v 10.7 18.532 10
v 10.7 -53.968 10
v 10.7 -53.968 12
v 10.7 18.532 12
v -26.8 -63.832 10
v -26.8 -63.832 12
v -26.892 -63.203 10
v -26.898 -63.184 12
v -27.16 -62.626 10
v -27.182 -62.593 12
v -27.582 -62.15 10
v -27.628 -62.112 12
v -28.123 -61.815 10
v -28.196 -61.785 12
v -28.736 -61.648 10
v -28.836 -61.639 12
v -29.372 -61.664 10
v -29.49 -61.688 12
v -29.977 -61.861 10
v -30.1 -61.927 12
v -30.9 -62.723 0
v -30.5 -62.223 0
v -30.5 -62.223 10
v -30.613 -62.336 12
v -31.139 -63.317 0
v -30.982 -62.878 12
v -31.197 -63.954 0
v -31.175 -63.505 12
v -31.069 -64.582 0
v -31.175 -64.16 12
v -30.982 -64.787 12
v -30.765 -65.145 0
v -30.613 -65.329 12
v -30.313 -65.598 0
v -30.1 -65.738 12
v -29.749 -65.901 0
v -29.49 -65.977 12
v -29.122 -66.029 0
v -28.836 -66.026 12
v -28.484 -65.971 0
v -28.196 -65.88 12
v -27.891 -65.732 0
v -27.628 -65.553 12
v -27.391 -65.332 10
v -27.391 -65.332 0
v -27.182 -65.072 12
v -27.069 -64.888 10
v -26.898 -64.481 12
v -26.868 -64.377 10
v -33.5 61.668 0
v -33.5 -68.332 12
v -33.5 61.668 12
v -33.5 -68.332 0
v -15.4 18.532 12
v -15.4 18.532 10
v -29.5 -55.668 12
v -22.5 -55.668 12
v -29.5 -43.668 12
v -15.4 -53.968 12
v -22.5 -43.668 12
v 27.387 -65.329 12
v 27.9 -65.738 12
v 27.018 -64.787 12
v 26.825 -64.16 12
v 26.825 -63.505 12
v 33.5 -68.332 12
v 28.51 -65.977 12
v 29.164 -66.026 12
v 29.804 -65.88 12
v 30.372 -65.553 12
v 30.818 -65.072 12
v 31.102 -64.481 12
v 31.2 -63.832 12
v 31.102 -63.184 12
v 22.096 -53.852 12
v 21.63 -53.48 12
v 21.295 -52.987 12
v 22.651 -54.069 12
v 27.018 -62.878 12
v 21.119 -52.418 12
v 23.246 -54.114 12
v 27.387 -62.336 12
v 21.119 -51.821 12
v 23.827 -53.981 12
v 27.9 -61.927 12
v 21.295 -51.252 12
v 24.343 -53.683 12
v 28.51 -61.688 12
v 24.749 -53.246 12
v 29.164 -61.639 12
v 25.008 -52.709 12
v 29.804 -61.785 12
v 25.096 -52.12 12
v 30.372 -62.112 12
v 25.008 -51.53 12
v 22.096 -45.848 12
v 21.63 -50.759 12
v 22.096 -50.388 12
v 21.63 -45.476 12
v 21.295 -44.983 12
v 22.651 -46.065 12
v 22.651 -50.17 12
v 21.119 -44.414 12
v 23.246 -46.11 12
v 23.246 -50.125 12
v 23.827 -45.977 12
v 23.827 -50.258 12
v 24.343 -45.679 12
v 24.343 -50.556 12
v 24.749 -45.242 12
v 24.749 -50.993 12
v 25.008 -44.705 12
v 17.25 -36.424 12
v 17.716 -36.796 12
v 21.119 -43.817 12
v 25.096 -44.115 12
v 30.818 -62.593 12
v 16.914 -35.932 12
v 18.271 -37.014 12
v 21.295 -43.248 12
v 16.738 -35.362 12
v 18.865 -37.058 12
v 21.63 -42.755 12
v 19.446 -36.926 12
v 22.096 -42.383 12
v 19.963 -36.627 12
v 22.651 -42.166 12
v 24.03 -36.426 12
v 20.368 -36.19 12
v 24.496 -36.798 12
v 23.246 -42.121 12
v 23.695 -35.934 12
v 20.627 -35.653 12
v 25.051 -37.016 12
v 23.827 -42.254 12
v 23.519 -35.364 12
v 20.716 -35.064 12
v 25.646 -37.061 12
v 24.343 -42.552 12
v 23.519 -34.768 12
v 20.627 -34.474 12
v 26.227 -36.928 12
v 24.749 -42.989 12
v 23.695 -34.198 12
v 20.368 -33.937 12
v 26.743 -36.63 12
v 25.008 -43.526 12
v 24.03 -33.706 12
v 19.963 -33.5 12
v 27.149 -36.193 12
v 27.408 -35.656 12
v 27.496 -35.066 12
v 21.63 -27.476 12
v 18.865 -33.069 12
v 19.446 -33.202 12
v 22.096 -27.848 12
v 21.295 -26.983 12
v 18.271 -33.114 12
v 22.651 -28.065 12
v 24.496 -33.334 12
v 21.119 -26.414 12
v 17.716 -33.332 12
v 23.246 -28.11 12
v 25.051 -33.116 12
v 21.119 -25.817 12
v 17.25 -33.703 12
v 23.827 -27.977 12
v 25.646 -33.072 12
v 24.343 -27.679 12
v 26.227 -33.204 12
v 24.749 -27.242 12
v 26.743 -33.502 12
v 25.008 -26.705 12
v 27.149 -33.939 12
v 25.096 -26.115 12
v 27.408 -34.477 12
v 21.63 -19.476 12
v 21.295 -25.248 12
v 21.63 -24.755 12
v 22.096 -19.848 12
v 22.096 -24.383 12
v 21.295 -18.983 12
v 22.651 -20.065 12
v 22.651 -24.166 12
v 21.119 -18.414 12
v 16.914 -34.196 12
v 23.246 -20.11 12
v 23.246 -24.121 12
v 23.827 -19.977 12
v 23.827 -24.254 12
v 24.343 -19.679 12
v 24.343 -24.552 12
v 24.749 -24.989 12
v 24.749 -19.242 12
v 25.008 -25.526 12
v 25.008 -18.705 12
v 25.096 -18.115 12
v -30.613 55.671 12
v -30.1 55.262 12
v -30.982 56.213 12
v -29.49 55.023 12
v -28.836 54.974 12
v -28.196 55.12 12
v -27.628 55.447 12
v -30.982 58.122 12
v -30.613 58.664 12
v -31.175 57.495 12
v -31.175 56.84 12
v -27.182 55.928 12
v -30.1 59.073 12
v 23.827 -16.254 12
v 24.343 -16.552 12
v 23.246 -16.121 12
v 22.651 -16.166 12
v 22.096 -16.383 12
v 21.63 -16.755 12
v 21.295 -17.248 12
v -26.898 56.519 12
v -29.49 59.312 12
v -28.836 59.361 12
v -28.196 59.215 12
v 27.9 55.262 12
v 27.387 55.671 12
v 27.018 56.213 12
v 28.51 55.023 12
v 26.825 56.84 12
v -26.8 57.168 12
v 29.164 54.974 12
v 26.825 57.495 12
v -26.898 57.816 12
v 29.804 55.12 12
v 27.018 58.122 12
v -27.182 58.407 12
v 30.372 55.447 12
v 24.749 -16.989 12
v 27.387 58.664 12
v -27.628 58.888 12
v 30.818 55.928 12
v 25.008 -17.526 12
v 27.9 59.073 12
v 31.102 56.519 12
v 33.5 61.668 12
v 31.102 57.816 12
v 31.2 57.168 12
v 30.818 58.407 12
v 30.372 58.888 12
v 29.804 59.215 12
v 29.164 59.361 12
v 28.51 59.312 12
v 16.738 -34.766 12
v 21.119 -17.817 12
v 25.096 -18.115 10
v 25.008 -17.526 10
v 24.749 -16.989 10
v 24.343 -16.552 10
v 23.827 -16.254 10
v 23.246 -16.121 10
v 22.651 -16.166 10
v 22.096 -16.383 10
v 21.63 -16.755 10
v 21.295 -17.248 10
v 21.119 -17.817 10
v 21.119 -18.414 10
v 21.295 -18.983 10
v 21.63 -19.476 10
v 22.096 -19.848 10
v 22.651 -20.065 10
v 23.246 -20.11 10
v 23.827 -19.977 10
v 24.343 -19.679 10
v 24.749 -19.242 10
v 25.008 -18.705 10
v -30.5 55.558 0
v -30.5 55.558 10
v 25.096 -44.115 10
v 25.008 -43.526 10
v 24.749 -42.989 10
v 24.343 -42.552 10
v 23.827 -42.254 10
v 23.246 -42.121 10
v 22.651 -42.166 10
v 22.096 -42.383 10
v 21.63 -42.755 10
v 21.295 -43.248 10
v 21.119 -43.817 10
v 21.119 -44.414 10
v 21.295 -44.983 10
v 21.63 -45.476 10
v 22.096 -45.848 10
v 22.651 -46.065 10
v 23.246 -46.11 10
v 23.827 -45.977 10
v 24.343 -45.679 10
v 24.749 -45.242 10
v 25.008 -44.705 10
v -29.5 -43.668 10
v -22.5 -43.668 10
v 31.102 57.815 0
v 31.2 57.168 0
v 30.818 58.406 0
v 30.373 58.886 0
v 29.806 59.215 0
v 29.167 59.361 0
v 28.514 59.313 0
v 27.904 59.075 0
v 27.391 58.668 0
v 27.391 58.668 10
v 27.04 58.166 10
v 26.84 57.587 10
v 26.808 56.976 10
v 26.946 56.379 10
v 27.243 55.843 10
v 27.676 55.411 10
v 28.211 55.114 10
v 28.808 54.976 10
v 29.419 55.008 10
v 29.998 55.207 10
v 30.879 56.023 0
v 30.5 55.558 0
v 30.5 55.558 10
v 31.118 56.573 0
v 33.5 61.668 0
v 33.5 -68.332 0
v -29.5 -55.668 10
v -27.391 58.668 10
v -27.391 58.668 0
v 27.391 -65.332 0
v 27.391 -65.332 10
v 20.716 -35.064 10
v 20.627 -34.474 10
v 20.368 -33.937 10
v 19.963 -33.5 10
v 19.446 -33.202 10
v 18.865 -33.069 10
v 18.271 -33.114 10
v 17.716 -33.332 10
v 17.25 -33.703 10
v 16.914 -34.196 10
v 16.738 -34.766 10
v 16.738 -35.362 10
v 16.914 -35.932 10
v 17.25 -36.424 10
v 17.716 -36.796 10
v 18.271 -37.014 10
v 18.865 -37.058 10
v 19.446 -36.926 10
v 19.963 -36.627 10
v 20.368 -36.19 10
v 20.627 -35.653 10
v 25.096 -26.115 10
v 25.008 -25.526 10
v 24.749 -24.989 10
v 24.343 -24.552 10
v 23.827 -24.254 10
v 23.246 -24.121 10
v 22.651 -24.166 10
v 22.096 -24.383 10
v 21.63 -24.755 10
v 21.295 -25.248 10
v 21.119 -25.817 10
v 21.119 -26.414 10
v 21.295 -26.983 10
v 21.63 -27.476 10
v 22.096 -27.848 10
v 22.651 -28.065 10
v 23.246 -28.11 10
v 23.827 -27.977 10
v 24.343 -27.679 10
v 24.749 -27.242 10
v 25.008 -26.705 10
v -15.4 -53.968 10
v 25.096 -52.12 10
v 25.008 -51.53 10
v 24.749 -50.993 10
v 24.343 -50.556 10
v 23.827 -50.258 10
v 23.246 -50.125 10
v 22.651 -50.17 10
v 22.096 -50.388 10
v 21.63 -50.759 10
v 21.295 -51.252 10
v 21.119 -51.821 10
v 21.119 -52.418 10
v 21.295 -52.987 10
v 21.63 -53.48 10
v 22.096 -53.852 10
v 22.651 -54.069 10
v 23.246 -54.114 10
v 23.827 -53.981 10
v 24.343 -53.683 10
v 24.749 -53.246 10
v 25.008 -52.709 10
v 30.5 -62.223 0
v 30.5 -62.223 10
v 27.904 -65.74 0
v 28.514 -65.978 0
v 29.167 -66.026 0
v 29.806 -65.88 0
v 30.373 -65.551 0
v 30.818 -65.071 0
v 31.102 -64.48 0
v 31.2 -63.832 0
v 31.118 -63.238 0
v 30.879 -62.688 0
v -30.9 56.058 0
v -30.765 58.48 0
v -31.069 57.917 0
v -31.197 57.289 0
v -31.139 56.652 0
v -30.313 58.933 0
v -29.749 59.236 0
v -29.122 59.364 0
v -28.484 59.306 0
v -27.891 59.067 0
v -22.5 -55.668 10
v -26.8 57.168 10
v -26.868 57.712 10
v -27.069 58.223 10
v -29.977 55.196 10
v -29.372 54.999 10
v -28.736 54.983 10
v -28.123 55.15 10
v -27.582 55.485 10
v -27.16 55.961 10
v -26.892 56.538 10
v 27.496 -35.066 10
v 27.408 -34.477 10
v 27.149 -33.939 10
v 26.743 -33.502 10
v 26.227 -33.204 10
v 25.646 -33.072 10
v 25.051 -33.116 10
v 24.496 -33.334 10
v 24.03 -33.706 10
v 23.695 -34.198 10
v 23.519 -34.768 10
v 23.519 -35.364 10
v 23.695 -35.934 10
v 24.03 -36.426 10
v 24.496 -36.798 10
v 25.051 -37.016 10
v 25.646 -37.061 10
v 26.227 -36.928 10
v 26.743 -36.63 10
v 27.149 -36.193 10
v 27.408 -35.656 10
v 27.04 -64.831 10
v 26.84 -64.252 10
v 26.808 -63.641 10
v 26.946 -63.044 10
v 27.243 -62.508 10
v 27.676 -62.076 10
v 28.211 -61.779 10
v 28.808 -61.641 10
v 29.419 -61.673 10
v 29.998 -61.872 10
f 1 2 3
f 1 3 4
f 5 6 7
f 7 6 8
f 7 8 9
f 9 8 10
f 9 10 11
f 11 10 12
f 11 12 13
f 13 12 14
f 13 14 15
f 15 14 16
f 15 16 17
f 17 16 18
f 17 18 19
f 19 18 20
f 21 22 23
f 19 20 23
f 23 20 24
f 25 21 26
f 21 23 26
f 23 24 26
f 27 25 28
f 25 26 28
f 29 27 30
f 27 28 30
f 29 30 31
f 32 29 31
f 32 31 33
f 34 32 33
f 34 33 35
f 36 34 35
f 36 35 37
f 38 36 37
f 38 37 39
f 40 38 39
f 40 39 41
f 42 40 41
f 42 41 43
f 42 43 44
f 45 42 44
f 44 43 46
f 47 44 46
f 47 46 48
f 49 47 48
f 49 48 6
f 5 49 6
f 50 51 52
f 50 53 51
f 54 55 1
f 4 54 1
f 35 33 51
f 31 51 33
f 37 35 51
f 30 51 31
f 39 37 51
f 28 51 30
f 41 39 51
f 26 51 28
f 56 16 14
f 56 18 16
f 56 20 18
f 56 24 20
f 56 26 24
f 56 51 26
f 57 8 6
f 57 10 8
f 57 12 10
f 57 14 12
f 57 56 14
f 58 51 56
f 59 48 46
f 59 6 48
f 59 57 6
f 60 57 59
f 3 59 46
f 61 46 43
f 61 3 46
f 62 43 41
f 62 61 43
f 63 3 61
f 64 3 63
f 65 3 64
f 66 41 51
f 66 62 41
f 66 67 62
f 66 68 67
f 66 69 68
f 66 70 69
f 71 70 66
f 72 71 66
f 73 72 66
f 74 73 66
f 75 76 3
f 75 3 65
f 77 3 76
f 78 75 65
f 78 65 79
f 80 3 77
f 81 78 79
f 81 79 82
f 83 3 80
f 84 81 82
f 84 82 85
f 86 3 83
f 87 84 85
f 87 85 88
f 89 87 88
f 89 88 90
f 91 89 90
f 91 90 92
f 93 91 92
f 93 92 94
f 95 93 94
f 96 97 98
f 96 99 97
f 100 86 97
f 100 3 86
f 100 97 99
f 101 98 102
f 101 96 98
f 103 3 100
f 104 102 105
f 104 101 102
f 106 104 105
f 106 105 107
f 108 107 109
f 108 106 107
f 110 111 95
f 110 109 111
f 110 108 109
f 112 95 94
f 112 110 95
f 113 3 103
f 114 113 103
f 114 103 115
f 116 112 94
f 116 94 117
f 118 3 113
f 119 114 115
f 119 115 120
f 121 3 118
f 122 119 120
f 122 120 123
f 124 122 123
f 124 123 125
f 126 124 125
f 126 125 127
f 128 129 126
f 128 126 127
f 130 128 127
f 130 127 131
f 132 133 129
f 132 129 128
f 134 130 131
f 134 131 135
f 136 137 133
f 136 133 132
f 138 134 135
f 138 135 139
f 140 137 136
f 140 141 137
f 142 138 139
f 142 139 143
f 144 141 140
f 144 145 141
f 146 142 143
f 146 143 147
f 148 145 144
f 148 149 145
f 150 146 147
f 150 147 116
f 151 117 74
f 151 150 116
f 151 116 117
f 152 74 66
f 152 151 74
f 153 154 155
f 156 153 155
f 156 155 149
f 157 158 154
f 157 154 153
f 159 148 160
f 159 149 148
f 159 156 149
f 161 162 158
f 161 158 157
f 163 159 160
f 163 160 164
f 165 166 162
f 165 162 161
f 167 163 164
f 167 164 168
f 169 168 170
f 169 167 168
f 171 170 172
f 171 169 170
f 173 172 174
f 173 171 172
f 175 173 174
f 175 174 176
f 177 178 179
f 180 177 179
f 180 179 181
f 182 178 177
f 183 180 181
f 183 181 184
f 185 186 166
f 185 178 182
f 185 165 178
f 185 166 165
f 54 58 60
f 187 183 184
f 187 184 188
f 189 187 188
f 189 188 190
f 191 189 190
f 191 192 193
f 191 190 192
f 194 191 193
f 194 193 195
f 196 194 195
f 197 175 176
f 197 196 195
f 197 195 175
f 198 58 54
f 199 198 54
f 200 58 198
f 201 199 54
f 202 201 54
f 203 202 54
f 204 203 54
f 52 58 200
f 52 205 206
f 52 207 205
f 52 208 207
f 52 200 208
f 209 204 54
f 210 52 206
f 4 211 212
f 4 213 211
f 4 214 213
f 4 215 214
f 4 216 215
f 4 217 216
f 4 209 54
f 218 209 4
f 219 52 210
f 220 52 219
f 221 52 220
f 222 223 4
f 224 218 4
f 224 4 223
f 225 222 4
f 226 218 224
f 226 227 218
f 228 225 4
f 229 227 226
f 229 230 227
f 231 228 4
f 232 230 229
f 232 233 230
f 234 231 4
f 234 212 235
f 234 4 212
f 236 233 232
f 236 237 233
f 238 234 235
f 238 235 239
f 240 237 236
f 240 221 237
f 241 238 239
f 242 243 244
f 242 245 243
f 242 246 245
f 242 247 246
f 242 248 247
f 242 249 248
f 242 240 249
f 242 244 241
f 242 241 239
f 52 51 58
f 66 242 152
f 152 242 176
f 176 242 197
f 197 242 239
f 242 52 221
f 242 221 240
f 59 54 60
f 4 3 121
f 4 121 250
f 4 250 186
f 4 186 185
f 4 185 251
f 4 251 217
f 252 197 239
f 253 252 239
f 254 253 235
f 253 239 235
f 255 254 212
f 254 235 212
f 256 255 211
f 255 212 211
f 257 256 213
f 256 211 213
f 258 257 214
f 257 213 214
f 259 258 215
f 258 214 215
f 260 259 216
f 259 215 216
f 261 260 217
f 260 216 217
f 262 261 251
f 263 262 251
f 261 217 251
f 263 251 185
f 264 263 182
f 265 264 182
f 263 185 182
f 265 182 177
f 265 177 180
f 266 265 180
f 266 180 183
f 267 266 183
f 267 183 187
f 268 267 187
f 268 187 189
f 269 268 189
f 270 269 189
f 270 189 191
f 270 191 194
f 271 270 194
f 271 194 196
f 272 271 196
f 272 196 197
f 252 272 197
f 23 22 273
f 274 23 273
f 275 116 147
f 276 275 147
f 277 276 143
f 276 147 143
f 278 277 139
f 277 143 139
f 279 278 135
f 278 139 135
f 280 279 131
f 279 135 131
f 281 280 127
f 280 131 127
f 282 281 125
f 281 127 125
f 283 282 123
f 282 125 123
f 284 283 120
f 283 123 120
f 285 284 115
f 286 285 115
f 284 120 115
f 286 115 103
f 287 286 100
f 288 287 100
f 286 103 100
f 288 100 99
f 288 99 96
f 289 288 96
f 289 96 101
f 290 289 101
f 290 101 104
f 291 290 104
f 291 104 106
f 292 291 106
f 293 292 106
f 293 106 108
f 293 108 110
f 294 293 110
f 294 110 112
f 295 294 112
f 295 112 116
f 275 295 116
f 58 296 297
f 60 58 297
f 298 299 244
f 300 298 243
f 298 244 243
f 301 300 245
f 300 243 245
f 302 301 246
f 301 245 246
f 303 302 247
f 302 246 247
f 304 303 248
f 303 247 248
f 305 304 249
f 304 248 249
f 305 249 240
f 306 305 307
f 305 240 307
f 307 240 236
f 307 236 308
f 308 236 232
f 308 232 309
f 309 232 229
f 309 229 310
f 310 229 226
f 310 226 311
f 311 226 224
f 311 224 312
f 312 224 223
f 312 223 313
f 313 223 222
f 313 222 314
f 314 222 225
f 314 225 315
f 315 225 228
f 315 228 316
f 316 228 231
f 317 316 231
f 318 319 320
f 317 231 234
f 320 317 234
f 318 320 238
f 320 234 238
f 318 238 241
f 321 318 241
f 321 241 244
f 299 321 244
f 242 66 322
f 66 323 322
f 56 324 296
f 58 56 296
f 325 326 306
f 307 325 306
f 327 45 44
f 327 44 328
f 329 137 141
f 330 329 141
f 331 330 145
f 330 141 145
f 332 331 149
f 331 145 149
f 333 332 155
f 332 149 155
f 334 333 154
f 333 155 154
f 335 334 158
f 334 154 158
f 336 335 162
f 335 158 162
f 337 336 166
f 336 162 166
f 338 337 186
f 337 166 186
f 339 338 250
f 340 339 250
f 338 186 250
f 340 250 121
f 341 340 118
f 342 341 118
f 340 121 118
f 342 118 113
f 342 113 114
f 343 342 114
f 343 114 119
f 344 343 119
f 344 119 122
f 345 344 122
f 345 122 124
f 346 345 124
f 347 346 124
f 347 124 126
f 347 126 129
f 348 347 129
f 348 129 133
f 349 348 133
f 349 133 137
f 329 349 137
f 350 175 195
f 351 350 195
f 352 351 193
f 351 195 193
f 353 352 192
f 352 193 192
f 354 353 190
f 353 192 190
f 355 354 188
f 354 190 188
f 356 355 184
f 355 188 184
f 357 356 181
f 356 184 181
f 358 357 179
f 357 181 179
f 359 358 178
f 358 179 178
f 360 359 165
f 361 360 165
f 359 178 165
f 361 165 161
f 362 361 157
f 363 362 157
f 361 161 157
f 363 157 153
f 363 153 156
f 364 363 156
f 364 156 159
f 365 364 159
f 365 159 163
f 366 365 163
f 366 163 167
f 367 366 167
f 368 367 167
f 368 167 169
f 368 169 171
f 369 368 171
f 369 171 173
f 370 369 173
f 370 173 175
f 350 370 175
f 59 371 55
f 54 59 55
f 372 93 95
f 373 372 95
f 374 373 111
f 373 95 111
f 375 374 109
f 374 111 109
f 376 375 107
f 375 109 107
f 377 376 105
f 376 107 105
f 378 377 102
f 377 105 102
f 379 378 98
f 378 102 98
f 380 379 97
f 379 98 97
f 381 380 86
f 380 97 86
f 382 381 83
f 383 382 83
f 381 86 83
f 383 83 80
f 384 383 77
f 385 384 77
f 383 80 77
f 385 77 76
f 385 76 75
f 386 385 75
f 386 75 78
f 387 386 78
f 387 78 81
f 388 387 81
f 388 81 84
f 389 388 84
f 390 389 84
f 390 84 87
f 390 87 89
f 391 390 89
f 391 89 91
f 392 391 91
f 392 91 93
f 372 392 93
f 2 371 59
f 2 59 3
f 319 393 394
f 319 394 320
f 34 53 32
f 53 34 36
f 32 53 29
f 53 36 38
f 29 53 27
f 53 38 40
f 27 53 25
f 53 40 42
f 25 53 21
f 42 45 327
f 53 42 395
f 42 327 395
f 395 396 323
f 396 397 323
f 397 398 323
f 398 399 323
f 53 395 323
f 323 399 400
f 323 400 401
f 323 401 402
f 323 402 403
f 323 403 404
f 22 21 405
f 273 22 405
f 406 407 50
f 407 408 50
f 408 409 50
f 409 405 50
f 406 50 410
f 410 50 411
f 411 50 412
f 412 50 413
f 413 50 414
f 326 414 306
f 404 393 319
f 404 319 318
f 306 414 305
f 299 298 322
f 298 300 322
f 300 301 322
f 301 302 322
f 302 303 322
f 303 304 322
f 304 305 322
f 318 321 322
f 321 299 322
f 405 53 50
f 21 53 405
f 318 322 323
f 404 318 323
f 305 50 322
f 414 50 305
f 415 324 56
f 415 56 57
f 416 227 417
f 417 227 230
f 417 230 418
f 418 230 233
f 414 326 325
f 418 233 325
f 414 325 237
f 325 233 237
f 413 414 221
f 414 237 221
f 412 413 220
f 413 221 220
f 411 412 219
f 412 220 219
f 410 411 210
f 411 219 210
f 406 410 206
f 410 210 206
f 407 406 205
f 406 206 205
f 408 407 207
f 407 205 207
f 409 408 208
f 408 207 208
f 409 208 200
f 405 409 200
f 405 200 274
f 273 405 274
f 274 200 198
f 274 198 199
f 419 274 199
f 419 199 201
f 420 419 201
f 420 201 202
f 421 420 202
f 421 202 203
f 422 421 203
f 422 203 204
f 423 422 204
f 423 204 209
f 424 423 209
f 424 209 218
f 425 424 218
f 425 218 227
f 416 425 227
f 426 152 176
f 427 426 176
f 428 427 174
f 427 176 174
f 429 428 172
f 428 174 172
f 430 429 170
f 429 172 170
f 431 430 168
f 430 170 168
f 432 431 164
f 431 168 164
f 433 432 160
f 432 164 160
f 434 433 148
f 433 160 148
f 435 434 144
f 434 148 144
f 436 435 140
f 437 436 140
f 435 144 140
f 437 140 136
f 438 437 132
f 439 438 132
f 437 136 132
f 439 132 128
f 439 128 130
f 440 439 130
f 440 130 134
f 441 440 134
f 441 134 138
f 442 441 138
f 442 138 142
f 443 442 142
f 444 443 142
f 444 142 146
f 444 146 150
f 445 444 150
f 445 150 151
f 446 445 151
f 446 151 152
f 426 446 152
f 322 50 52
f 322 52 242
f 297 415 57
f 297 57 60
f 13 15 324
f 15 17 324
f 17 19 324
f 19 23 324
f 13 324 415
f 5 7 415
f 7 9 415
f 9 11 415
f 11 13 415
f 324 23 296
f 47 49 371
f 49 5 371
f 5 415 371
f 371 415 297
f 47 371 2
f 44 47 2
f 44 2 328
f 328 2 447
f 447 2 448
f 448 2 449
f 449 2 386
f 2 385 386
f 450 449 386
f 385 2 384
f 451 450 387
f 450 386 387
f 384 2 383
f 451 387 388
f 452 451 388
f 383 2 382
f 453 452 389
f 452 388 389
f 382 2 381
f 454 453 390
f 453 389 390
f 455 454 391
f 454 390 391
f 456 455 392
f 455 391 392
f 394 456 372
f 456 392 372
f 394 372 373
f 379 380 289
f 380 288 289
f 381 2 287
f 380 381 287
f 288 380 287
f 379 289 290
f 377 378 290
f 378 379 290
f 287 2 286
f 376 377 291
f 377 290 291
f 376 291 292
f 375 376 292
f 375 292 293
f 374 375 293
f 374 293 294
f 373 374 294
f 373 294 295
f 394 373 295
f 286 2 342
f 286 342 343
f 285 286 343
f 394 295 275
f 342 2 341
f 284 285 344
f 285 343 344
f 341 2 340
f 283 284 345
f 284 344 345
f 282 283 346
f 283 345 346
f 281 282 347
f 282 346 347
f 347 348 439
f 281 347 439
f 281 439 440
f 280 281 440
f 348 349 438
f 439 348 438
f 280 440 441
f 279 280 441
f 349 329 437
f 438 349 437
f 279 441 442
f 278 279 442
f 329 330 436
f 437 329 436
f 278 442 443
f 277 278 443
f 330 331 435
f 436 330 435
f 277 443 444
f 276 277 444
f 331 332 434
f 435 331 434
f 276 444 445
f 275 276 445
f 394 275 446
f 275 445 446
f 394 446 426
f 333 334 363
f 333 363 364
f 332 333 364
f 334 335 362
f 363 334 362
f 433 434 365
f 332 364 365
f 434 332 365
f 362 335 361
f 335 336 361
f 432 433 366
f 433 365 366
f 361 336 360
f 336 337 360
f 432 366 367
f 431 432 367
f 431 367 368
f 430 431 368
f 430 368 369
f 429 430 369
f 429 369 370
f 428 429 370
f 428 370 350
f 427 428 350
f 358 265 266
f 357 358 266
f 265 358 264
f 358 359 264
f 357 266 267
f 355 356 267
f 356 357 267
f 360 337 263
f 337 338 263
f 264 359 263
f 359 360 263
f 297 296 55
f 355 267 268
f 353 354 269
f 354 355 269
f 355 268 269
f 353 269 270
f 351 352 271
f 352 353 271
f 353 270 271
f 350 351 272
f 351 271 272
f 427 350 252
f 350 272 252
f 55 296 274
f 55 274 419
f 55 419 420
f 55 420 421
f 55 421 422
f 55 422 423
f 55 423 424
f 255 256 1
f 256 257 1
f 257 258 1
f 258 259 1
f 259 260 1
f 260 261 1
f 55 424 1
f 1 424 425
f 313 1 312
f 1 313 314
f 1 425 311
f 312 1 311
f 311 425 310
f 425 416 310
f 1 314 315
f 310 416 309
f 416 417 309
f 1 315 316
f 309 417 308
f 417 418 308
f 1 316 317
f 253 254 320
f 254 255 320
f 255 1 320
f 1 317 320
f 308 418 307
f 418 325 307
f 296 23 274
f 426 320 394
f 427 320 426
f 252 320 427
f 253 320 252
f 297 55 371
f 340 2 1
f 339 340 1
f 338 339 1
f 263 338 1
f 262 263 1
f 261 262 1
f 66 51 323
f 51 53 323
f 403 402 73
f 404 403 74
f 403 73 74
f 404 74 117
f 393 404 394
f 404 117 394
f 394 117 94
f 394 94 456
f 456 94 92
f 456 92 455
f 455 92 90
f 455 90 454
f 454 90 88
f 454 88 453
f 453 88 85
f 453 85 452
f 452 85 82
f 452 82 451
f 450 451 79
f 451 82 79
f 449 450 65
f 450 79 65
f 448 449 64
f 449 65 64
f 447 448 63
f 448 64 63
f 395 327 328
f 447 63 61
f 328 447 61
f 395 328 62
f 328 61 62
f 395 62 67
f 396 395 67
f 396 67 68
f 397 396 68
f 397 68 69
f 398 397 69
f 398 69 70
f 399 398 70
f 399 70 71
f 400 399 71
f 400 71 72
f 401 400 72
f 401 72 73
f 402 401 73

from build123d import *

# Parameters (mm, degrees)
SKETCH1_W           = 67
SKETCH1_H           = 130
SKETCH1_W_2         = 61
SKETCH1_H_2         = 124
BOSS_EXTRUDE1_DEPTH = 10
SKETCH2_W           = 67
SKETCH2_H           = 130
SKETCH2_W_2         = 26.1
SKETCH2_H_2         = 72.5
SKETCH2_W_3         = 7
SKETCH2_H_3         = 11.999999998
BOSS_EXTRUDE2_DEPTH = 2
SKETCH3_R           = 2
CUT_EXTRUDE1_DEPTH  = 78.042717027
SKETCH4_R           = 2.2
CUT_EXTRUDE2_DEPTH  = 78.042717027


with BuildPart() as part:
    # Sketch1 → Boss-Extrude1 (new body)
    with BuildSketch(Plane.XY):
        with Locations((0, -3.332497736)):
            Rectangle(SKETCH1_W, SKETCH1_H)
        with Locations((0, -3.332497736)):
            Rectangle(SKETCH1_W_2, SKETCH1_H_2, mode=Mode.SUBTRACT)
    extrude(amount=BOSS_EXTRUDE1_DEPTH)

    # Sketch2 → Boss-Extrude2 (add)
    with BuildSketch(Plane.XY.offset(10)):
        with Locations((0, -3.332497736)):
            Rectangle(SKETCH2_W, SKETCH2_H)
        with Locations((-2.35, -17.717502264)):
            Rectangle(SKETCH2_W_2, SKETCH2_H_2, mode=Mode.SUBTRACT)
        with Locations((-26, -49.667502265)):
            Rectangle(SKETCH2_W_3, SKETCH2_H_3, mode=Mode.SUBTRACT)
    extrude(amount=BOSS_EXTRUDE2_DEPTH)

    # Sketch3 → Cut-Extrude1 (cut, through all)
    with BuildSketch(Plane.XY.offset(12)):
        with Locations((23.09645, -52.119552264)):
            Circle(SKETCH3_R)
        with Locations((23.09645, -44.115452264)):
            Circle(SKETCH3_R)
        with Locations((18.715647246, -35.063805606)):
            Circle(SKETCH3_R)
        with Locations((23.09645, -26.115452264)):
            Circle(SKETCH3_R)
        with Locations((23.09645, -18.115452264)):
            Circle(SKETCH3_R)
        with Locations((25.496463554, -35.066106361)):
            Circle(SKETCH3_R)
    extrude(amount=-CUT_EXTRUDE1_DEPTH, mode=Mode.SUBTRACT)

    # Sketch4 → Cut-Extrude2 (cut, through all)
    with BuildSketch(Plane.XY.offset(12)):
        with Locations((-29, 57.167502264)):
            Circle(SKETCH4_R)
        with Locations((29, 57.167502264)):
            Circle(SKETCH4_R)
        with Locations((-29, -63.832497736)):
            Circle(SKETCH4_R)
        with Locations((29, -63.832497736)):
            Circle(SKETCH4_R)
    extrude(amount=-CUT_EXTRUDE2_DEPTH, mode=Mode.SUBTRACT)


solid = part.part
